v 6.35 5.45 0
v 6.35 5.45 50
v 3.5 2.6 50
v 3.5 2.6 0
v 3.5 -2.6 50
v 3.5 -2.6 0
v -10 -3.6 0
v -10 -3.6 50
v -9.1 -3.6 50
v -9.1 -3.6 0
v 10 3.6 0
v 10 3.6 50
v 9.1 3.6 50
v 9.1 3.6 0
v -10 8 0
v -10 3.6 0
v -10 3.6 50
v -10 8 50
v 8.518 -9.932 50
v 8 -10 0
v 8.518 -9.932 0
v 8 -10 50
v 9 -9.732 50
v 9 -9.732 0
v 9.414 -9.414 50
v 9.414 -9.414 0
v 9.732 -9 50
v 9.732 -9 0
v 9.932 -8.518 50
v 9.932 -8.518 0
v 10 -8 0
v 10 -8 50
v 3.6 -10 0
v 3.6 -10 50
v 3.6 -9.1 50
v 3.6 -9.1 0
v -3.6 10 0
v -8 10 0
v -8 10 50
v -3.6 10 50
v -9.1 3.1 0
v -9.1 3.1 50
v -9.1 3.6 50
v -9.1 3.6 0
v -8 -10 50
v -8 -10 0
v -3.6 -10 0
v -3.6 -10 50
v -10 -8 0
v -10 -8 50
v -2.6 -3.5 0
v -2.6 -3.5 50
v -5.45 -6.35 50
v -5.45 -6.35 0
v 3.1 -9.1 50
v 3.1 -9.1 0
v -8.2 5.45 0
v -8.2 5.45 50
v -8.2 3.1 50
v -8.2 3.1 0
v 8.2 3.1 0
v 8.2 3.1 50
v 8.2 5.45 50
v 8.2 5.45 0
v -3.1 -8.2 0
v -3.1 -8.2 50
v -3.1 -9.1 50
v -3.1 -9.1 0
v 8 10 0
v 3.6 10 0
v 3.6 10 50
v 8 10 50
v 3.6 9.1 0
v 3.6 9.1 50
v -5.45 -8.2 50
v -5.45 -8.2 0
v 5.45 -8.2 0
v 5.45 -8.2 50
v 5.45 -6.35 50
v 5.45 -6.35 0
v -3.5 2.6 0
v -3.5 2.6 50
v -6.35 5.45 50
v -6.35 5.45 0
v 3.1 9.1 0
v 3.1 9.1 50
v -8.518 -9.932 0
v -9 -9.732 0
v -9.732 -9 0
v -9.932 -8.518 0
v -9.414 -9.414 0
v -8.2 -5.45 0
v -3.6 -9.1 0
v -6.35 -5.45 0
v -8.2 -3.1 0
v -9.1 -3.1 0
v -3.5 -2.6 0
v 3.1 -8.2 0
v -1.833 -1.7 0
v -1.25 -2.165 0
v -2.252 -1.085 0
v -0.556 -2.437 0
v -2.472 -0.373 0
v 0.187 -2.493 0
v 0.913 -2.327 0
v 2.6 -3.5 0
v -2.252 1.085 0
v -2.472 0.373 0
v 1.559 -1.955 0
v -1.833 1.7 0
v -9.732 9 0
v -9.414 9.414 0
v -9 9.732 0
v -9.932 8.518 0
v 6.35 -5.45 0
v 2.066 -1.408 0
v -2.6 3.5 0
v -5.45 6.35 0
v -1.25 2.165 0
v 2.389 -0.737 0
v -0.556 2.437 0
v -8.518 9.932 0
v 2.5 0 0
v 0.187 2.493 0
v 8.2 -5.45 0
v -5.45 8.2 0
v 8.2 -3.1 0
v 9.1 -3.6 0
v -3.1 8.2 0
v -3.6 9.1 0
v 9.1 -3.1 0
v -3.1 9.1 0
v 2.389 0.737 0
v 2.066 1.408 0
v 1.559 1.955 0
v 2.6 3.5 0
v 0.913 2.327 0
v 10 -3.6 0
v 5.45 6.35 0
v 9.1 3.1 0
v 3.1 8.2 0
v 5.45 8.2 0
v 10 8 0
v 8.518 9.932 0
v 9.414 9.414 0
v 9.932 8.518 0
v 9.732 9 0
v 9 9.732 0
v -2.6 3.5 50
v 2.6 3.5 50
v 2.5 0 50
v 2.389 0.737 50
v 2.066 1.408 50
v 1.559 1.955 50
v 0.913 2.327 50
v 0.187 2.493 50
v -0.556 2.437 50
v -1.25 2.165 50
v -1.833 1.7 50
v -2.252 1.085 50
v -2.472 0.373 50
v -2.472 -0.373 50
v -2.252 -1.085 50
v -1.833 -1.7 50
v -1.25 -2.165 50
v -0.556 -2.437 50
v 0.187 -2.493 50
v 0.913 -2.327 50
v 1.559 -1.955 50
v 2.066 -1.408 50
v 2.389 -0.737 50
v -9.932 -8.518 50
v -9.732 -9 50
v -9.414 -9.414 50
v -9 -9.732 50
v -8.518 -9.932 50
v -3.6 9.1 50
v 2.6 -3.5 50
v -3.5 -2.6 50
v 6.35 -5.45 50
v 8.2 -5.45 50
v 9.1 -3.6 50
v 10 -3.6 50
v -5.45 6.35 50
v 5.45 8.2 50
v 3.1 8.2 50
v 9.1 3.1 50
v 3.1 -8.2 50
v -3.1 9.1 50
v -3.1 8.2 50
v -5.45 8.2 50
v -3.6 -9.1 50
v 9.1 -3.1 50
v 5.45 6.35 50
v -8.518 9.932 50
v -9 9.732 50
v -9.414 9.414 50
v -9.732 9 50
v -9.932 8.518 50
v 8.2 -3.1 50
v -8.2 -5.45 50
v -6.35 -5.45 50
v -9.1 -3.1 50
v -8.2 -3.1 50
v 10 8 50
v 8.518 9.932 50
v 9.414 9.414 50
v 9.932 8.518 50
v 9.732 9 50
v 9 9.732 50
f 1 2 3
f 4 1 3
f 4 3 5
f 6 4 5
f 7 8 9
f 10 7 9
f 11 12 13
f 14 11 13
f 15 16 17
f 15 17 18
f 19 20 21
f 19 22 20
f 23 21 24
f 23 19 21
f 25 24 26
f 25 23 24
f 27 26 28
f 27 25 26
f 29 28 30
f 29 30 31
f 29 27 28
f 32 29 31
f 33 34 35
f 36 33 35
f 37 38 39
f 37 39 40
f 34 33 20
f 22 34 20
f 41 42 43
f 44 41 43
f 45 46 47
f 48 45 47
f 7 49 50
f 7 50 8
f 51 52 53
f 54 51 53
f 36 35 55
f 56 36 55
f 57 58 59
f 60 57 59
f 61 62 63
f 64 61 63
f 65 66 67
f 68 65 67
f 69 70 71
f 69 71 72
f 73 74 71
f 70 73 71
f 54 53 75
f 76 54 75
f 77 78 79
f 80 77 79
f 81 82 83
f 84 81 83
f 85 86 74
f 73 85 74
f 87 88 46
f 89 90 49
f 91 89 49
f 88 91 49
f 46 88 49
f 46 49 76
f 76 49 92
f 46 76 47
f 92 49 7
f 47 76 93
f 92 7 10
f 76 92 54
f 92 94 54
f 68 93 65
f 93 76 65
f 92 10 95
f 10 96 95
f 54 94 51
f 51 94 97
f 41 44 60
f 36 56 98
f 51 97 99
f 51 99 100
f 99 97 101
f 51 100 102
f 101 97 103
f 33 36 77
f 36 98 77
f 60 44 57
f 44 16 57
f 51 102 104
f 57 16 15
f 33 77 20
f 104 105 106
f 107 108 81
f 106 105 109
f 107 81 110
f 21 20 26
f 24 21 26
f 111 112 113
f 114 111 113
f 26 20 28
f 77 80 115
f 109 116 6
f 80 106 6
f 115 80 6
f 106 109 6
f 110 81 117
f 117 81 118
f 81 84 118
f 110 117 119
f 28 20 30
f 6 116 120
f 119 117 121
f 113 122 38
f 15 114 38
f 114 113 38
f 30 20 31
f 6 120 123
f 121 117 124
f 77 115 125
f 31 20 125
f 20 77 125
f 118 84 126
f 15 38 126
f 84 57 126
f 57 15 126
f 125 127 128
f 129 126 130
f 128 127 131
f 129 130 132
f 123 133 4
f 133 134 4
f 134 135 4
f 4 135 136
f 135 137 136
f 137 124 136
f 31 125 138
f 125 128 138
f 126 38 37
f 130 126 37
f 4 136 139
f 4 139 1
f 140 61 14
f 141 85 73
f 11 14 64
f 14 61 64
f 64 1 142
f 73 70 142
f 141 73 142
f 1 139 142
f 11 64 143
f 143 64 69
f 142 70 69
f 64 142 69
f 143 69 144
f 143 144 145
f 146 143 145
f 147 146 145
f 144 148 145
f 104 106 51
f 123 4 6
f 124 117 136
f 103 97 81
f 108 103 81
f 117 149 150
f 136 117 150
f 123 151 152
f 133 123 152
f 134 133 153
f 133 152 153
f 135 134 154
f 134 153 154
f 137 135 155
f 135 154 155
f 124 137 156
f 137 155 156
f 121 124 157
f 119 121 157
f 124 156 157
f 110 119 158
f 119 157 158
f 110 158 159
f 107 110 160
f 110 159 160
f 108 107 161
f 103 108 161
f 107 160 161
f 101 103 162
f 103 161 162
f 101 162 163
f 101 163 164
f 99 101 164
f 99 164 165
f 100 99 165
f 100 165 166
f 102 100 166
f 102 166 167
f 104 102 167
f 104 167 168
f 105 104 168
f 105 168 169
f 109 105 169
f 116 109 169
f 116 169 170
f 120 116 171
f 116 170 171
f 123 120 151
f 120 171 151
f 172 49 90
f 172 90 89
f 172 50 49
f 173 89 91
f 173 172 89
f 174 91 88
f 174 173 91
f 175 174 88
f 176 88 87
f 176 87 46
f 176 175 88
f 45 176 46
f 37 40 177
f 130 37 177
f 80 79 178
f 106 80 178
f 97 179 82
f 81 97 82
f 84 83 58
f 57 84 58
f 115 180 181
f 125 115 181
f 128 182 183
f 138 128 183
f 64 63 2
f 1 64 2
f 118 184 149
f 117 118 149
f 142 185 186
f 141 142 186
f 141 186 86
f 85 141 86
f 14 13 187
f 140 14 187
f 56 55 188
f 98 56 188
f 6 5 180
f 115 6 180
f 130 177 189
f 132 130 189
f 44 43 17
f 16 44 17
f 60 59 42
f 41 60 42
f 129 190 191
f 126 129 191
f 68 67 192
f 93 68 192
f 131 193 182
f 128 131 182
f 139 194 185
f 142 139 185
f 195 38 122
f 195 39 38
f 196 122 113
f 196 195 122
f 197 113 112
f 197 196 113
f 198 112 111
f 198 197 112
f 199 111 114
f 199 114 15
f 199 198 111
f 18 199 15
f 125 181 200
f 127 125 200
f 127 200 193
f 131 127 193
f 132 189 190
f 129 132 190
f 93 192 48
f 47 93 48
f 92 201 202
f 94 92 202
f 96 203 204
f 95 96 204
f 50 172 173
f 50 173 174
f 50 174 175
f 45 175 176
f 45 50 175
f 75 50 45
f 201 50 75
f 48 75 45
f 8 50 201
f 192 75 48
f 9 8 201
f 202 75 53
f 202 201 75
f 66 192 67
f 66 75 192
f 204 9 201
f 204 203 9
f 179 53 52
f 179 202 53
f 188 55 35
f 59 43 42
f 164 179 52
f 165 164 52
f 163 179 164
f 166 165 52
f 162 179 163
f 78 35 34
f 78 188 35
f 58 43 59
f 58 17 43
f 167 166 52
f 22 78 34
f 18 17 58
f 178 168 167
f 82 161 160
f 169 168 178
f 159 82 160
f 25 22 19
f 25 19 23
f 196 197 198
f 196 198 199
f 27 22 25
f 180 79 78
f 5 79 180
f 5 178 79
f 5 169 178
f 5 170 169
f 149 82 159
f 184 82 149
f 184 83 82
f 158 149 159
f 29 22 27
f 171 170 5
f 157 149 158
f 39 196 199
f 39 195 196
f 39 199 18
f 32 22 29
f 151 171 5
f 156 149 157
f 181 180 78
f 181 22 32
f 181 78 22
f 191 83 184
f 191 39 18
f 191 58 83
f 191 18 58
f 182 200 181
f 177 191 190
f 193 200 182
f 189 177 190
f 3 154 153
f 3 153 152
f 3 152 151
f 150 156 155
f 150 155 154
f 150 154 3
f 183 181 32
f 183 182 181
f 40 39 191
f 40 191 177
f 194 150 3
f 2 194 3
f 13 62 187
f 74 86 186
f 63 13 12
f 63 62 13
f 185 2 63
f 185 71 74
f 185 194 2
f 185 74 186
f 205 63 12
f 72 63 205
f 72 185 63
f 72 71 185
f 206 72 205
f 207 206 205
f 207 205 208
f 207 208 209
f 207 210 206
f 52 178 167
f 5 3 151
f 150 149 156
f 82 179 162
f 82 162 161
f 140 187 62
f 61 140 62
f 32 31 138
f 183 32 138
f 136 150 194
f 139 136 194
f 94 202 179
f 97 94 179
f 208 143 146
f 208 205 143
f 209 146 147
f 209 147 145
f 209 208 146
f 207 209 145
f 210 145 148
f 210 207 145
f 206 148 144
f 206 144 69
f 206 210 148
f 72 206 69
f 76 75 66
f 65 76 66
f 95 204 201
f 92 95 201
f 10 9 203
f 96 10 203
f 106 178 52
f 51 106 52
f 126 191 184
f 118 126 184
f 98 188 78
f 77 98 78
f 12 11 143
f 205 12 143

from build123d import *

# Parameters (mm, degrees)
SKETCH_1_W               = 20
SKETCH_1_H               = 20
EXTRUDE_1_DEPTH          = 50
SKETCH_2_R               = 2.5
CUT_EXTRUDE_1_DEPTH      = 52.961524227
PATTERN_CIRCULAR_1_COUNT = 4
FILLET_1_R               = 2


with BuildPart() as part:
    # 草图1 → 凸台-拉伸1 (new body)
    with BuildSketch(Plane.XY):
        Rectangle(SKETCH_1_W, SKETCH_1_H)
    extrude(amount=EXTRUDE_1_DEPTH)

    # 草图2 → 切除-拉伸1 (cut, through all)
    with BuildSketch(Plane.XY.offset(50)):
        Polygon((-9.1, -3.1), (-8.2, -3.1), (-8.2, -5.45), (-6.35, -5.45), (-3.5, -2.6), (-3.5, 2.6), (-6.35, 5.45), (-8.2, 5.45), (-8.2, 3.1), (-9.1, 3.1), (-9.1, 3.6), (-10, 3.6), (-10, -3.6), (-9.1, -3.6), align=None)
        Circle(SKETCH_2_R)
    cut_extrude_1 = extrude(amount=-CUT_EXTRUDE_1_DEPTH, mode=Mode.SUBTRACT)

    # 阵列(圆周)1: 切除-拉伸1 ×4 about axis
    pattern_circular_1_axis = Axis((0, 0, 0), (0, 0, 1))
    for i in range(1, PATTERN_CIRCULAR_1_COUNT):
        add(cut_extrude_1.rotate(pattern_circular_1_axis, i * 360 / PATTERN_CIRCULAR_1_COUNT), mode=Mode.SUBTRACT)

    # 圆角1
    fillet_1_edges = [part.edges().sort_by_distance(p)[0] for p in [
        (10, -10, 25),
        (-10, -10, 25),
        (-10, 10, 25),
        (10, 10, 25),
    ]]
    fillet(fillet_1_edges, radius=FILLET_1_R)


solid = part.part
